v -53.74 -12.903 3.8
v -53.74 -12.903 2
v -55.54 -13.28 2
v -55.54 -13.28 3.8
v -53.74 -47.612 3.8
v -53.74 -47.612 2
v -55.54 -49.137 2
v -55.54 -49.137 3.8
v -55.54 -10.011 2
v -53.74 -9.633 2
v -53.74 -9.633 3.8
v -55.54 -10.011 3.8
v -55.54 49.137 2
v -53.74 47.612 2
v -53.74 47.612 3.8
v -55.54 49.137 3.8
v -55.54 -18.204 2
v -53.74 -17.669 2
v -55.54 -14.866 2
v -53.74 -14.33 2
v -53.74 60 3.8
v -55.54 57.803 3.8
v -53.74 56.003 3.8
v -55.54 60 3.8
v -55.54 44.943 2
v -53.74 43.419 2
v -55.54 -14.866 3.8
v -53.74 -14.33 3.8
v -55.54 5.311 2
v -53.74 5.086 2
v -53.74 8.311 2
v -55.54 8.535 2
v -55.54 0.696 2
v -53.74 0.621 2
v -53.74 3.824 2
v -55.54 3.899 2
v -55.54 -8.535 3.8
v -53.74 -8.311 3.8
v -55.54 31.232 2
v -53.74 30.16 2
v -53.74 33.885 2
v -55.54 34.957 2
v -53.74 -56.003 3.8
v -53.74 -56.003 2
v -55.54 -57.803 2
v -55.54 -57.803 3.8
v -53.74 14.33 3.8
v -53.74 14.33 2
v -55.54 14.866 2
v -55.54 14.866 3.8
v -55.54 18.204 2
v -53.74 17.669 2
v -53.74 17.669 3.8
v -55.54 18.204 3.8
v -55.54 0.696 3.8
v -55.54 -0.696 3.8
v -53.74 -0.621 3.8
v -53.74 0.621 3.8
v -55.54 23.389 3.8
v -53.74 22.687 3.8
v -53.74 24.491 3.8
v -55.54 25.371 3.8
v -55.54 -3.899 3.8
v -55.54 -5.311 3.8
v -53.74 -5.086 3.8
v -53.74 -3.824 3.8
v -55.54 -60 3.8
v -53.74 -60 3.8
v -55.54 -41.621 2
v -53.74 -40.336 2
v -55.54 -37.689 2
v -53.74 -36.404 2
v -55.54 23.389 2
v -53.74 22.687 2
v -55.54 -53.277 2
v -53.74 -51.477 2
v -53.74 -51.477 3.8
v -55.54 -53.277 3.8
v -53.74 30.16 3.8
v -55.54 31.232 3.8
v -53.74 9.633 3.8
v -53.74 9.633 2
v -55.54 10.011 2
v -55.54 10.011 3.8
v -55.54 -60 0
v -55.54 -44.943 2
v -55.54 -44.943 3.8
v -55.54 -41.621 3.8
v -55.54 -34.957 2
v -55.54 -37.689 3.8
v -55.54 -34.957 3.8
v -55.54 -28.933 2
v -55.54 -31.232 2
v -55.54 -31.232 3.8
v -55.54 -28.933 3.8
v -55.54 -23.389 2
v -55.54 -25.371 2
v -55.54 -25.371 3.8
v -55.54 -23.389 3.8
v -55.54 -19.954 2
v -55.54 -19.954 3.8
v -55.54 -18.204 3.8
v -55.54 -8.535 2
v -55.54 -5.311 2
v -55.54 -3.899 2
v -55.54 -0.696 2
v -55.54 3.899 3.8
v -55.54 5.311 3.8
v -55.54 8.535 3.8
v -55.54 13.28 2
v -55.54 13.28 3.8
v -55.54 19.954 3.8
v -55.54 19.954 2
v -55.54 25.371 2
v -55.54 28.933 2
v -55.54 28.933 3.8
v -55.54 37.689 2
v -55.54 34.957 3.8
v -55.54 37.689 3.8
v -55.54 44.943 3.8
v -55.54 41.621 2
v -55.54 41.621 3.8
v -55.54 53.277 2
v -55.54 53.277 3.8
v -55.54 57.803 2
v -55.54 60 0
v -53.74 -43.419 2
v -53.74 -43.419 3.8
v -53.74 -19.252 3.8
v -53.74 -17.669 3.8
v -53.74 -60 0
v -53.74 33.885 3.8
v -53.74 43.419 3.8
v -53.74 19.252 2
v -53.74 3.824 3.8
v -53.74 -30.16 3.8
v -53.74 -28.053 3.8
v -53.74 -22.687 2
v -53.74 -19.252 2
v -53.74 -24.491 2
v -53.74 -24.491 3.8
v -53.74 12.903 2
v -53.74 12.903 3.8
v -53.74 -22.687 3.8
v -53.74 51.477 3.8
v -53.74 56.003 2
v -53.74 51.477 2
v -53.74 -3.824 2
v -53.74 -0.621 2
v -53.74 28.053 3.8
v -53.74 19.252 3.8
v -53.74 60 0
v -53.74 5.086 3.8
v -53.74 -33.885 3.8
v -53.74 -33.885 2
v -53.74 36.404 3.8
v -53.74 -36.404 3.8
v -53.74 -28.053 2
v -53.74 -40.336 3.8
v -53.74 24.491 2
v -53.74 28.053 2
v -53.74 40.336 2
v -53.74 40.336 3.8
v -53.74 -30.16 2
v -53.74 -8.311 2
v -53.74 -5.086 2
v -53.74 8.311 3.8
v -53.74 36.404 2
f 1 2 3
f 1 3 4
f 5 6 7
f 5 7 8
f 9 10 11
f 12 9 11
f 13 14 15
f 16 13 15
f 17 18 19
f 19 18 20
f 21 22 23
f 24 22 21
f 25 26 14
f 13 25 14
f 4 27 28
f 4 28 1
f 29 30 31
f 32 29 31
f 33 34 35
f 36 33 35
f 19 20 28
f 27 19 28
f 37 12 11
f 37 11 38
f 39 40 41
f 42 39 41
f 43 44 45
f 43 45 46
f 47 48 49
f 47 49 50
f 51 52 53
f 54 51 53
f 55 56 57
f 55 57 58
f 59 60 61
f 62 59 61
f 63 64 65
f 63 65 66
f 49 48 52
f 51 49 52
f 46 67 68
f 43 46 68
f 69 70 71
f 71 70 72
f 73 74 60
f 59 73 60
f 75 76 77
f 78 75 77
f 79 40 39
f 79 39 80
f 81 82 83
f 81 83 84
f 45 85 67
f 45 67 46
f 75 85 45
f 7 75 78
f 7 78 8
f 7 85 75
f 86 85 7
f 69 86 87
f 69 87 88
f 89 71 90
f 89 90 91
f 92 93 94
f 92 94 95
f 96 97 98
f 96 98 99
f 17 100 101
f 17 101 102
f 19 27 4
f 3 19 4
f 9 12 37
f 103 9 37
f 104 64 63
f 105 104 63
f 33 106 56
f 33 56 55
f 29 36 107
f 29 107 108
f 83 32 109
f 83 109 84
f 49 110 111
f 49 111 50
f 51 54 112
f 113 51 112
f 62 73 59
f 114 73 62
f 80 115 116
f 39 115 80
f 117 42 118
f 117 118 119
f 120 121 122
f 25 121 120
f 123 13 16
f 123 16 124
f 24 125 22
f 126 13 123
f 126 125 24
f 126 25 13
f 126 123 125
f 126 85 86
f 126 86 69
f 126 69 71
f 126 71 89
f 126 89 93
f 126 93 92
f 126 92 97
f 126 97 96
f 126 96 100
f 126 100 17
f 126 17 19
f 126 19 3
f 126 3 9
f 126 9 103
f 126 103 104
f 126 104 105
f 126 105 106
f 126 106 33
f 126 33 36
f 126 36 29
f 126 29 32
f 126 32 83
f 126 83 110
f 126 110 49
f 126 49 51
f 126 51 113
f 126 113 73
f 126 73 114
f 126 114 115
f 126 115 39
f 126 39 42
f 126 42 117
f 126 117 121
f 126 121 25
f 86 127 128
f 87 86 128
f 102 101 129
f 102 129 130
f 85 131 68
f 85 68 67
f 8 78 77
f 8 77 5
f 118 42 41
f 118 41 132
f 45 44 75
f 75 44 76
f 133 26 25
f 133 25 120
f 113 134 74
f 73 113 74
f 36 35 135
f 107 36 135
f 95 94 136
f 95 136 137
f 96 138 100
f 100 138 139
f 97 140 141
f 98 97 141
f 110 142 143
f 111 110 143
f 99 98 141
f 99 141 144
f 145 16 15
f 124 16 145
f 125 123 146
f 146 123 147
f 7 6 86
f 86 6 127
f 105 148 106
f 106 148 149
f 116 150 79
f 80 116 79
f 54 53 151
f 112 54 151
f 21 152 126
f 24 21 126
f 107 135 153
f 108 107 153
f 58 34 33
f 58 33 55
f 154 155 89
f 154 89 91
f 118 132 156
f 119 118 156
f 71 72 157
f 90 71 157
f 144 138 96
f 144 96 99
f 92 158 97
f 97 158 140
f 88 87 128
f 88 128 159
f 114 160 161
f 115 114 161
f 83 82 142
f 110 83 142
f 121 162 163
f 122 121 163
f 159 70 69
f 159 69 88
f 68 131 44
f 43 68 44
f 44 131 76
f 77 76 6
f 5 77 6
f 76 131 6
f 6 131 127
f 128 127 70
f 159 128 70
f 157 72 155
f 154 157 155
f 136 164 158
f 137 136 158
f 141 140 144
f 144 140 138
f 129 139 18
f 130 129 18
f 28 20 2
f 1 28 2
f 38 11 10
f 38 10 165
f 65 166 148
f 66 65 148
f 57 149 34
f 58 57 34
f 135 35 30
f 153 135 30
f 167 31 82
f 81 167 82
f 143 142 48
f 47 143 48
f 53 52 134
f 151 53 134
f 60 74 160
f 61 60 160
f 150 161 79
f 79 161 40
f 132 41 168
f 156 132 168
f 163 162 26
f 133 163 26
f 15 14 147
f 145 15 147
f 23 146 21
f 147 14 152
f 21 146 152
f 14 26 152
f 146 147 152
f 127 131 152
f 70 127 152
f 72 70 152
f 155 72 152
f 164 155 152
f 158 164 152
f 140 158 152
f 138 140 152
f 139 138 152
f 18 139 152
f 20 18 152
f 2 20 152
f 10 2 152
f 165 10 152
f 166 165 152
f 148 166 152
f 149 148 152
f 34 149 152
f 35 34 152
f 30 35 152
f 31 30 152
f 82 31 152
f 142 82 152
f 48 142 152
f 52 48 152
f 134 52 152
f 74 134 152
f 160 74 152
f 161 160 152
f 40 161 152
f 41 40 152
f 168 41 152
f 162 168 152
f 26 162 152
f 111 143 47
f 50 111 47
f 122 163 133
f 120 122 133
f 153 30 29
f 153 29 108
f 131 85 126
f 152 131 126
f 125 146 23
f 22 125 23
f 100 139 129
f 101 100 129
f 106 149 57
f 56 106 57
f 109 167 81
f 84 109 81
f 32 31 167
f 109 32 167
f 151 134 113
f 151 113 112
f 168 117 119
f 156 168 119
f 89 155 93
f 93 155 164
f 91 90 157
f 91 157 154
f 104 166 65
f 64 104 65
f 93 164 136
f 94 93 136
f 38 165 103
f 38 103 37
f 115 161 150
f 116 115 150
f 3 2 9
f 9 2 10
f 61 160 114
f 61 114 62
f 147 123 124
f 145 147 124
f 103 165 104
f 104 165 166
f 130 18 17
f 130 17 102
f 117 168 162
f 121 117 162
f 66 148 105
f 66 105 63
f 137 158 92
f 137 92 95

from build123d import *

# Parameters (mm, degrees)
SKETCH_W             = 120
SKETCH_H             = 1.8
PAD_DEPTH            = 3.8
SKETCH001_W          = 3.2
SKETCH001_H          = 3
POCKET_DEPTH         = 325.418725
POLARPATTERN_COUNT   = 20
POLARPATTERN_ANGLE   = 90
BODY_PLACEMENT_ANGLE = 45


with BuildPart() as part:
    # Sketch → Pad (new body)
    with BuildSketch(Plane(origin=(-38, 38, 0), x_dir=(0.707107, 0.707107, 0), z_dir=(0, 0, 1))):
        with Locations((0, 0.9)):
            Rectangle(SKETCH_W, SKETCH_H)
    extrude(amount=PAD_DEPTH)

    # Sketch001 → Pocket (cut, through all)
    with BuildSketch(Plane.XZ):
        with Locations((0, 3.5)):
            Rectangle(SKETCH001_W, SKETCH001_H)
    pocket = extrude(amount=-POCKET_DEPTH, mode=Mode.SUBTRACT)

    # PolarPattern: Pocket ×20 about axis
    polarpattern_axis = Axis((0, 0, 0), (0, 0, 1))
    for i in range(1, POLARPATTERN_COUNT):
        add(pocket.rotate(polarpattern_axis, i * POLARPATTERN_ANGLE / (POLARPATTERN_COUNT - 1)), mode=Mode.SUBTRACT)


with BuildPart() as part_1:
    # Body placement: moved
    add(part.part.rotate(Axis((0, 0, 0), (0, 0, 1)), BODY_PLACEMENT_ANGLE))


solid = part_1.part
